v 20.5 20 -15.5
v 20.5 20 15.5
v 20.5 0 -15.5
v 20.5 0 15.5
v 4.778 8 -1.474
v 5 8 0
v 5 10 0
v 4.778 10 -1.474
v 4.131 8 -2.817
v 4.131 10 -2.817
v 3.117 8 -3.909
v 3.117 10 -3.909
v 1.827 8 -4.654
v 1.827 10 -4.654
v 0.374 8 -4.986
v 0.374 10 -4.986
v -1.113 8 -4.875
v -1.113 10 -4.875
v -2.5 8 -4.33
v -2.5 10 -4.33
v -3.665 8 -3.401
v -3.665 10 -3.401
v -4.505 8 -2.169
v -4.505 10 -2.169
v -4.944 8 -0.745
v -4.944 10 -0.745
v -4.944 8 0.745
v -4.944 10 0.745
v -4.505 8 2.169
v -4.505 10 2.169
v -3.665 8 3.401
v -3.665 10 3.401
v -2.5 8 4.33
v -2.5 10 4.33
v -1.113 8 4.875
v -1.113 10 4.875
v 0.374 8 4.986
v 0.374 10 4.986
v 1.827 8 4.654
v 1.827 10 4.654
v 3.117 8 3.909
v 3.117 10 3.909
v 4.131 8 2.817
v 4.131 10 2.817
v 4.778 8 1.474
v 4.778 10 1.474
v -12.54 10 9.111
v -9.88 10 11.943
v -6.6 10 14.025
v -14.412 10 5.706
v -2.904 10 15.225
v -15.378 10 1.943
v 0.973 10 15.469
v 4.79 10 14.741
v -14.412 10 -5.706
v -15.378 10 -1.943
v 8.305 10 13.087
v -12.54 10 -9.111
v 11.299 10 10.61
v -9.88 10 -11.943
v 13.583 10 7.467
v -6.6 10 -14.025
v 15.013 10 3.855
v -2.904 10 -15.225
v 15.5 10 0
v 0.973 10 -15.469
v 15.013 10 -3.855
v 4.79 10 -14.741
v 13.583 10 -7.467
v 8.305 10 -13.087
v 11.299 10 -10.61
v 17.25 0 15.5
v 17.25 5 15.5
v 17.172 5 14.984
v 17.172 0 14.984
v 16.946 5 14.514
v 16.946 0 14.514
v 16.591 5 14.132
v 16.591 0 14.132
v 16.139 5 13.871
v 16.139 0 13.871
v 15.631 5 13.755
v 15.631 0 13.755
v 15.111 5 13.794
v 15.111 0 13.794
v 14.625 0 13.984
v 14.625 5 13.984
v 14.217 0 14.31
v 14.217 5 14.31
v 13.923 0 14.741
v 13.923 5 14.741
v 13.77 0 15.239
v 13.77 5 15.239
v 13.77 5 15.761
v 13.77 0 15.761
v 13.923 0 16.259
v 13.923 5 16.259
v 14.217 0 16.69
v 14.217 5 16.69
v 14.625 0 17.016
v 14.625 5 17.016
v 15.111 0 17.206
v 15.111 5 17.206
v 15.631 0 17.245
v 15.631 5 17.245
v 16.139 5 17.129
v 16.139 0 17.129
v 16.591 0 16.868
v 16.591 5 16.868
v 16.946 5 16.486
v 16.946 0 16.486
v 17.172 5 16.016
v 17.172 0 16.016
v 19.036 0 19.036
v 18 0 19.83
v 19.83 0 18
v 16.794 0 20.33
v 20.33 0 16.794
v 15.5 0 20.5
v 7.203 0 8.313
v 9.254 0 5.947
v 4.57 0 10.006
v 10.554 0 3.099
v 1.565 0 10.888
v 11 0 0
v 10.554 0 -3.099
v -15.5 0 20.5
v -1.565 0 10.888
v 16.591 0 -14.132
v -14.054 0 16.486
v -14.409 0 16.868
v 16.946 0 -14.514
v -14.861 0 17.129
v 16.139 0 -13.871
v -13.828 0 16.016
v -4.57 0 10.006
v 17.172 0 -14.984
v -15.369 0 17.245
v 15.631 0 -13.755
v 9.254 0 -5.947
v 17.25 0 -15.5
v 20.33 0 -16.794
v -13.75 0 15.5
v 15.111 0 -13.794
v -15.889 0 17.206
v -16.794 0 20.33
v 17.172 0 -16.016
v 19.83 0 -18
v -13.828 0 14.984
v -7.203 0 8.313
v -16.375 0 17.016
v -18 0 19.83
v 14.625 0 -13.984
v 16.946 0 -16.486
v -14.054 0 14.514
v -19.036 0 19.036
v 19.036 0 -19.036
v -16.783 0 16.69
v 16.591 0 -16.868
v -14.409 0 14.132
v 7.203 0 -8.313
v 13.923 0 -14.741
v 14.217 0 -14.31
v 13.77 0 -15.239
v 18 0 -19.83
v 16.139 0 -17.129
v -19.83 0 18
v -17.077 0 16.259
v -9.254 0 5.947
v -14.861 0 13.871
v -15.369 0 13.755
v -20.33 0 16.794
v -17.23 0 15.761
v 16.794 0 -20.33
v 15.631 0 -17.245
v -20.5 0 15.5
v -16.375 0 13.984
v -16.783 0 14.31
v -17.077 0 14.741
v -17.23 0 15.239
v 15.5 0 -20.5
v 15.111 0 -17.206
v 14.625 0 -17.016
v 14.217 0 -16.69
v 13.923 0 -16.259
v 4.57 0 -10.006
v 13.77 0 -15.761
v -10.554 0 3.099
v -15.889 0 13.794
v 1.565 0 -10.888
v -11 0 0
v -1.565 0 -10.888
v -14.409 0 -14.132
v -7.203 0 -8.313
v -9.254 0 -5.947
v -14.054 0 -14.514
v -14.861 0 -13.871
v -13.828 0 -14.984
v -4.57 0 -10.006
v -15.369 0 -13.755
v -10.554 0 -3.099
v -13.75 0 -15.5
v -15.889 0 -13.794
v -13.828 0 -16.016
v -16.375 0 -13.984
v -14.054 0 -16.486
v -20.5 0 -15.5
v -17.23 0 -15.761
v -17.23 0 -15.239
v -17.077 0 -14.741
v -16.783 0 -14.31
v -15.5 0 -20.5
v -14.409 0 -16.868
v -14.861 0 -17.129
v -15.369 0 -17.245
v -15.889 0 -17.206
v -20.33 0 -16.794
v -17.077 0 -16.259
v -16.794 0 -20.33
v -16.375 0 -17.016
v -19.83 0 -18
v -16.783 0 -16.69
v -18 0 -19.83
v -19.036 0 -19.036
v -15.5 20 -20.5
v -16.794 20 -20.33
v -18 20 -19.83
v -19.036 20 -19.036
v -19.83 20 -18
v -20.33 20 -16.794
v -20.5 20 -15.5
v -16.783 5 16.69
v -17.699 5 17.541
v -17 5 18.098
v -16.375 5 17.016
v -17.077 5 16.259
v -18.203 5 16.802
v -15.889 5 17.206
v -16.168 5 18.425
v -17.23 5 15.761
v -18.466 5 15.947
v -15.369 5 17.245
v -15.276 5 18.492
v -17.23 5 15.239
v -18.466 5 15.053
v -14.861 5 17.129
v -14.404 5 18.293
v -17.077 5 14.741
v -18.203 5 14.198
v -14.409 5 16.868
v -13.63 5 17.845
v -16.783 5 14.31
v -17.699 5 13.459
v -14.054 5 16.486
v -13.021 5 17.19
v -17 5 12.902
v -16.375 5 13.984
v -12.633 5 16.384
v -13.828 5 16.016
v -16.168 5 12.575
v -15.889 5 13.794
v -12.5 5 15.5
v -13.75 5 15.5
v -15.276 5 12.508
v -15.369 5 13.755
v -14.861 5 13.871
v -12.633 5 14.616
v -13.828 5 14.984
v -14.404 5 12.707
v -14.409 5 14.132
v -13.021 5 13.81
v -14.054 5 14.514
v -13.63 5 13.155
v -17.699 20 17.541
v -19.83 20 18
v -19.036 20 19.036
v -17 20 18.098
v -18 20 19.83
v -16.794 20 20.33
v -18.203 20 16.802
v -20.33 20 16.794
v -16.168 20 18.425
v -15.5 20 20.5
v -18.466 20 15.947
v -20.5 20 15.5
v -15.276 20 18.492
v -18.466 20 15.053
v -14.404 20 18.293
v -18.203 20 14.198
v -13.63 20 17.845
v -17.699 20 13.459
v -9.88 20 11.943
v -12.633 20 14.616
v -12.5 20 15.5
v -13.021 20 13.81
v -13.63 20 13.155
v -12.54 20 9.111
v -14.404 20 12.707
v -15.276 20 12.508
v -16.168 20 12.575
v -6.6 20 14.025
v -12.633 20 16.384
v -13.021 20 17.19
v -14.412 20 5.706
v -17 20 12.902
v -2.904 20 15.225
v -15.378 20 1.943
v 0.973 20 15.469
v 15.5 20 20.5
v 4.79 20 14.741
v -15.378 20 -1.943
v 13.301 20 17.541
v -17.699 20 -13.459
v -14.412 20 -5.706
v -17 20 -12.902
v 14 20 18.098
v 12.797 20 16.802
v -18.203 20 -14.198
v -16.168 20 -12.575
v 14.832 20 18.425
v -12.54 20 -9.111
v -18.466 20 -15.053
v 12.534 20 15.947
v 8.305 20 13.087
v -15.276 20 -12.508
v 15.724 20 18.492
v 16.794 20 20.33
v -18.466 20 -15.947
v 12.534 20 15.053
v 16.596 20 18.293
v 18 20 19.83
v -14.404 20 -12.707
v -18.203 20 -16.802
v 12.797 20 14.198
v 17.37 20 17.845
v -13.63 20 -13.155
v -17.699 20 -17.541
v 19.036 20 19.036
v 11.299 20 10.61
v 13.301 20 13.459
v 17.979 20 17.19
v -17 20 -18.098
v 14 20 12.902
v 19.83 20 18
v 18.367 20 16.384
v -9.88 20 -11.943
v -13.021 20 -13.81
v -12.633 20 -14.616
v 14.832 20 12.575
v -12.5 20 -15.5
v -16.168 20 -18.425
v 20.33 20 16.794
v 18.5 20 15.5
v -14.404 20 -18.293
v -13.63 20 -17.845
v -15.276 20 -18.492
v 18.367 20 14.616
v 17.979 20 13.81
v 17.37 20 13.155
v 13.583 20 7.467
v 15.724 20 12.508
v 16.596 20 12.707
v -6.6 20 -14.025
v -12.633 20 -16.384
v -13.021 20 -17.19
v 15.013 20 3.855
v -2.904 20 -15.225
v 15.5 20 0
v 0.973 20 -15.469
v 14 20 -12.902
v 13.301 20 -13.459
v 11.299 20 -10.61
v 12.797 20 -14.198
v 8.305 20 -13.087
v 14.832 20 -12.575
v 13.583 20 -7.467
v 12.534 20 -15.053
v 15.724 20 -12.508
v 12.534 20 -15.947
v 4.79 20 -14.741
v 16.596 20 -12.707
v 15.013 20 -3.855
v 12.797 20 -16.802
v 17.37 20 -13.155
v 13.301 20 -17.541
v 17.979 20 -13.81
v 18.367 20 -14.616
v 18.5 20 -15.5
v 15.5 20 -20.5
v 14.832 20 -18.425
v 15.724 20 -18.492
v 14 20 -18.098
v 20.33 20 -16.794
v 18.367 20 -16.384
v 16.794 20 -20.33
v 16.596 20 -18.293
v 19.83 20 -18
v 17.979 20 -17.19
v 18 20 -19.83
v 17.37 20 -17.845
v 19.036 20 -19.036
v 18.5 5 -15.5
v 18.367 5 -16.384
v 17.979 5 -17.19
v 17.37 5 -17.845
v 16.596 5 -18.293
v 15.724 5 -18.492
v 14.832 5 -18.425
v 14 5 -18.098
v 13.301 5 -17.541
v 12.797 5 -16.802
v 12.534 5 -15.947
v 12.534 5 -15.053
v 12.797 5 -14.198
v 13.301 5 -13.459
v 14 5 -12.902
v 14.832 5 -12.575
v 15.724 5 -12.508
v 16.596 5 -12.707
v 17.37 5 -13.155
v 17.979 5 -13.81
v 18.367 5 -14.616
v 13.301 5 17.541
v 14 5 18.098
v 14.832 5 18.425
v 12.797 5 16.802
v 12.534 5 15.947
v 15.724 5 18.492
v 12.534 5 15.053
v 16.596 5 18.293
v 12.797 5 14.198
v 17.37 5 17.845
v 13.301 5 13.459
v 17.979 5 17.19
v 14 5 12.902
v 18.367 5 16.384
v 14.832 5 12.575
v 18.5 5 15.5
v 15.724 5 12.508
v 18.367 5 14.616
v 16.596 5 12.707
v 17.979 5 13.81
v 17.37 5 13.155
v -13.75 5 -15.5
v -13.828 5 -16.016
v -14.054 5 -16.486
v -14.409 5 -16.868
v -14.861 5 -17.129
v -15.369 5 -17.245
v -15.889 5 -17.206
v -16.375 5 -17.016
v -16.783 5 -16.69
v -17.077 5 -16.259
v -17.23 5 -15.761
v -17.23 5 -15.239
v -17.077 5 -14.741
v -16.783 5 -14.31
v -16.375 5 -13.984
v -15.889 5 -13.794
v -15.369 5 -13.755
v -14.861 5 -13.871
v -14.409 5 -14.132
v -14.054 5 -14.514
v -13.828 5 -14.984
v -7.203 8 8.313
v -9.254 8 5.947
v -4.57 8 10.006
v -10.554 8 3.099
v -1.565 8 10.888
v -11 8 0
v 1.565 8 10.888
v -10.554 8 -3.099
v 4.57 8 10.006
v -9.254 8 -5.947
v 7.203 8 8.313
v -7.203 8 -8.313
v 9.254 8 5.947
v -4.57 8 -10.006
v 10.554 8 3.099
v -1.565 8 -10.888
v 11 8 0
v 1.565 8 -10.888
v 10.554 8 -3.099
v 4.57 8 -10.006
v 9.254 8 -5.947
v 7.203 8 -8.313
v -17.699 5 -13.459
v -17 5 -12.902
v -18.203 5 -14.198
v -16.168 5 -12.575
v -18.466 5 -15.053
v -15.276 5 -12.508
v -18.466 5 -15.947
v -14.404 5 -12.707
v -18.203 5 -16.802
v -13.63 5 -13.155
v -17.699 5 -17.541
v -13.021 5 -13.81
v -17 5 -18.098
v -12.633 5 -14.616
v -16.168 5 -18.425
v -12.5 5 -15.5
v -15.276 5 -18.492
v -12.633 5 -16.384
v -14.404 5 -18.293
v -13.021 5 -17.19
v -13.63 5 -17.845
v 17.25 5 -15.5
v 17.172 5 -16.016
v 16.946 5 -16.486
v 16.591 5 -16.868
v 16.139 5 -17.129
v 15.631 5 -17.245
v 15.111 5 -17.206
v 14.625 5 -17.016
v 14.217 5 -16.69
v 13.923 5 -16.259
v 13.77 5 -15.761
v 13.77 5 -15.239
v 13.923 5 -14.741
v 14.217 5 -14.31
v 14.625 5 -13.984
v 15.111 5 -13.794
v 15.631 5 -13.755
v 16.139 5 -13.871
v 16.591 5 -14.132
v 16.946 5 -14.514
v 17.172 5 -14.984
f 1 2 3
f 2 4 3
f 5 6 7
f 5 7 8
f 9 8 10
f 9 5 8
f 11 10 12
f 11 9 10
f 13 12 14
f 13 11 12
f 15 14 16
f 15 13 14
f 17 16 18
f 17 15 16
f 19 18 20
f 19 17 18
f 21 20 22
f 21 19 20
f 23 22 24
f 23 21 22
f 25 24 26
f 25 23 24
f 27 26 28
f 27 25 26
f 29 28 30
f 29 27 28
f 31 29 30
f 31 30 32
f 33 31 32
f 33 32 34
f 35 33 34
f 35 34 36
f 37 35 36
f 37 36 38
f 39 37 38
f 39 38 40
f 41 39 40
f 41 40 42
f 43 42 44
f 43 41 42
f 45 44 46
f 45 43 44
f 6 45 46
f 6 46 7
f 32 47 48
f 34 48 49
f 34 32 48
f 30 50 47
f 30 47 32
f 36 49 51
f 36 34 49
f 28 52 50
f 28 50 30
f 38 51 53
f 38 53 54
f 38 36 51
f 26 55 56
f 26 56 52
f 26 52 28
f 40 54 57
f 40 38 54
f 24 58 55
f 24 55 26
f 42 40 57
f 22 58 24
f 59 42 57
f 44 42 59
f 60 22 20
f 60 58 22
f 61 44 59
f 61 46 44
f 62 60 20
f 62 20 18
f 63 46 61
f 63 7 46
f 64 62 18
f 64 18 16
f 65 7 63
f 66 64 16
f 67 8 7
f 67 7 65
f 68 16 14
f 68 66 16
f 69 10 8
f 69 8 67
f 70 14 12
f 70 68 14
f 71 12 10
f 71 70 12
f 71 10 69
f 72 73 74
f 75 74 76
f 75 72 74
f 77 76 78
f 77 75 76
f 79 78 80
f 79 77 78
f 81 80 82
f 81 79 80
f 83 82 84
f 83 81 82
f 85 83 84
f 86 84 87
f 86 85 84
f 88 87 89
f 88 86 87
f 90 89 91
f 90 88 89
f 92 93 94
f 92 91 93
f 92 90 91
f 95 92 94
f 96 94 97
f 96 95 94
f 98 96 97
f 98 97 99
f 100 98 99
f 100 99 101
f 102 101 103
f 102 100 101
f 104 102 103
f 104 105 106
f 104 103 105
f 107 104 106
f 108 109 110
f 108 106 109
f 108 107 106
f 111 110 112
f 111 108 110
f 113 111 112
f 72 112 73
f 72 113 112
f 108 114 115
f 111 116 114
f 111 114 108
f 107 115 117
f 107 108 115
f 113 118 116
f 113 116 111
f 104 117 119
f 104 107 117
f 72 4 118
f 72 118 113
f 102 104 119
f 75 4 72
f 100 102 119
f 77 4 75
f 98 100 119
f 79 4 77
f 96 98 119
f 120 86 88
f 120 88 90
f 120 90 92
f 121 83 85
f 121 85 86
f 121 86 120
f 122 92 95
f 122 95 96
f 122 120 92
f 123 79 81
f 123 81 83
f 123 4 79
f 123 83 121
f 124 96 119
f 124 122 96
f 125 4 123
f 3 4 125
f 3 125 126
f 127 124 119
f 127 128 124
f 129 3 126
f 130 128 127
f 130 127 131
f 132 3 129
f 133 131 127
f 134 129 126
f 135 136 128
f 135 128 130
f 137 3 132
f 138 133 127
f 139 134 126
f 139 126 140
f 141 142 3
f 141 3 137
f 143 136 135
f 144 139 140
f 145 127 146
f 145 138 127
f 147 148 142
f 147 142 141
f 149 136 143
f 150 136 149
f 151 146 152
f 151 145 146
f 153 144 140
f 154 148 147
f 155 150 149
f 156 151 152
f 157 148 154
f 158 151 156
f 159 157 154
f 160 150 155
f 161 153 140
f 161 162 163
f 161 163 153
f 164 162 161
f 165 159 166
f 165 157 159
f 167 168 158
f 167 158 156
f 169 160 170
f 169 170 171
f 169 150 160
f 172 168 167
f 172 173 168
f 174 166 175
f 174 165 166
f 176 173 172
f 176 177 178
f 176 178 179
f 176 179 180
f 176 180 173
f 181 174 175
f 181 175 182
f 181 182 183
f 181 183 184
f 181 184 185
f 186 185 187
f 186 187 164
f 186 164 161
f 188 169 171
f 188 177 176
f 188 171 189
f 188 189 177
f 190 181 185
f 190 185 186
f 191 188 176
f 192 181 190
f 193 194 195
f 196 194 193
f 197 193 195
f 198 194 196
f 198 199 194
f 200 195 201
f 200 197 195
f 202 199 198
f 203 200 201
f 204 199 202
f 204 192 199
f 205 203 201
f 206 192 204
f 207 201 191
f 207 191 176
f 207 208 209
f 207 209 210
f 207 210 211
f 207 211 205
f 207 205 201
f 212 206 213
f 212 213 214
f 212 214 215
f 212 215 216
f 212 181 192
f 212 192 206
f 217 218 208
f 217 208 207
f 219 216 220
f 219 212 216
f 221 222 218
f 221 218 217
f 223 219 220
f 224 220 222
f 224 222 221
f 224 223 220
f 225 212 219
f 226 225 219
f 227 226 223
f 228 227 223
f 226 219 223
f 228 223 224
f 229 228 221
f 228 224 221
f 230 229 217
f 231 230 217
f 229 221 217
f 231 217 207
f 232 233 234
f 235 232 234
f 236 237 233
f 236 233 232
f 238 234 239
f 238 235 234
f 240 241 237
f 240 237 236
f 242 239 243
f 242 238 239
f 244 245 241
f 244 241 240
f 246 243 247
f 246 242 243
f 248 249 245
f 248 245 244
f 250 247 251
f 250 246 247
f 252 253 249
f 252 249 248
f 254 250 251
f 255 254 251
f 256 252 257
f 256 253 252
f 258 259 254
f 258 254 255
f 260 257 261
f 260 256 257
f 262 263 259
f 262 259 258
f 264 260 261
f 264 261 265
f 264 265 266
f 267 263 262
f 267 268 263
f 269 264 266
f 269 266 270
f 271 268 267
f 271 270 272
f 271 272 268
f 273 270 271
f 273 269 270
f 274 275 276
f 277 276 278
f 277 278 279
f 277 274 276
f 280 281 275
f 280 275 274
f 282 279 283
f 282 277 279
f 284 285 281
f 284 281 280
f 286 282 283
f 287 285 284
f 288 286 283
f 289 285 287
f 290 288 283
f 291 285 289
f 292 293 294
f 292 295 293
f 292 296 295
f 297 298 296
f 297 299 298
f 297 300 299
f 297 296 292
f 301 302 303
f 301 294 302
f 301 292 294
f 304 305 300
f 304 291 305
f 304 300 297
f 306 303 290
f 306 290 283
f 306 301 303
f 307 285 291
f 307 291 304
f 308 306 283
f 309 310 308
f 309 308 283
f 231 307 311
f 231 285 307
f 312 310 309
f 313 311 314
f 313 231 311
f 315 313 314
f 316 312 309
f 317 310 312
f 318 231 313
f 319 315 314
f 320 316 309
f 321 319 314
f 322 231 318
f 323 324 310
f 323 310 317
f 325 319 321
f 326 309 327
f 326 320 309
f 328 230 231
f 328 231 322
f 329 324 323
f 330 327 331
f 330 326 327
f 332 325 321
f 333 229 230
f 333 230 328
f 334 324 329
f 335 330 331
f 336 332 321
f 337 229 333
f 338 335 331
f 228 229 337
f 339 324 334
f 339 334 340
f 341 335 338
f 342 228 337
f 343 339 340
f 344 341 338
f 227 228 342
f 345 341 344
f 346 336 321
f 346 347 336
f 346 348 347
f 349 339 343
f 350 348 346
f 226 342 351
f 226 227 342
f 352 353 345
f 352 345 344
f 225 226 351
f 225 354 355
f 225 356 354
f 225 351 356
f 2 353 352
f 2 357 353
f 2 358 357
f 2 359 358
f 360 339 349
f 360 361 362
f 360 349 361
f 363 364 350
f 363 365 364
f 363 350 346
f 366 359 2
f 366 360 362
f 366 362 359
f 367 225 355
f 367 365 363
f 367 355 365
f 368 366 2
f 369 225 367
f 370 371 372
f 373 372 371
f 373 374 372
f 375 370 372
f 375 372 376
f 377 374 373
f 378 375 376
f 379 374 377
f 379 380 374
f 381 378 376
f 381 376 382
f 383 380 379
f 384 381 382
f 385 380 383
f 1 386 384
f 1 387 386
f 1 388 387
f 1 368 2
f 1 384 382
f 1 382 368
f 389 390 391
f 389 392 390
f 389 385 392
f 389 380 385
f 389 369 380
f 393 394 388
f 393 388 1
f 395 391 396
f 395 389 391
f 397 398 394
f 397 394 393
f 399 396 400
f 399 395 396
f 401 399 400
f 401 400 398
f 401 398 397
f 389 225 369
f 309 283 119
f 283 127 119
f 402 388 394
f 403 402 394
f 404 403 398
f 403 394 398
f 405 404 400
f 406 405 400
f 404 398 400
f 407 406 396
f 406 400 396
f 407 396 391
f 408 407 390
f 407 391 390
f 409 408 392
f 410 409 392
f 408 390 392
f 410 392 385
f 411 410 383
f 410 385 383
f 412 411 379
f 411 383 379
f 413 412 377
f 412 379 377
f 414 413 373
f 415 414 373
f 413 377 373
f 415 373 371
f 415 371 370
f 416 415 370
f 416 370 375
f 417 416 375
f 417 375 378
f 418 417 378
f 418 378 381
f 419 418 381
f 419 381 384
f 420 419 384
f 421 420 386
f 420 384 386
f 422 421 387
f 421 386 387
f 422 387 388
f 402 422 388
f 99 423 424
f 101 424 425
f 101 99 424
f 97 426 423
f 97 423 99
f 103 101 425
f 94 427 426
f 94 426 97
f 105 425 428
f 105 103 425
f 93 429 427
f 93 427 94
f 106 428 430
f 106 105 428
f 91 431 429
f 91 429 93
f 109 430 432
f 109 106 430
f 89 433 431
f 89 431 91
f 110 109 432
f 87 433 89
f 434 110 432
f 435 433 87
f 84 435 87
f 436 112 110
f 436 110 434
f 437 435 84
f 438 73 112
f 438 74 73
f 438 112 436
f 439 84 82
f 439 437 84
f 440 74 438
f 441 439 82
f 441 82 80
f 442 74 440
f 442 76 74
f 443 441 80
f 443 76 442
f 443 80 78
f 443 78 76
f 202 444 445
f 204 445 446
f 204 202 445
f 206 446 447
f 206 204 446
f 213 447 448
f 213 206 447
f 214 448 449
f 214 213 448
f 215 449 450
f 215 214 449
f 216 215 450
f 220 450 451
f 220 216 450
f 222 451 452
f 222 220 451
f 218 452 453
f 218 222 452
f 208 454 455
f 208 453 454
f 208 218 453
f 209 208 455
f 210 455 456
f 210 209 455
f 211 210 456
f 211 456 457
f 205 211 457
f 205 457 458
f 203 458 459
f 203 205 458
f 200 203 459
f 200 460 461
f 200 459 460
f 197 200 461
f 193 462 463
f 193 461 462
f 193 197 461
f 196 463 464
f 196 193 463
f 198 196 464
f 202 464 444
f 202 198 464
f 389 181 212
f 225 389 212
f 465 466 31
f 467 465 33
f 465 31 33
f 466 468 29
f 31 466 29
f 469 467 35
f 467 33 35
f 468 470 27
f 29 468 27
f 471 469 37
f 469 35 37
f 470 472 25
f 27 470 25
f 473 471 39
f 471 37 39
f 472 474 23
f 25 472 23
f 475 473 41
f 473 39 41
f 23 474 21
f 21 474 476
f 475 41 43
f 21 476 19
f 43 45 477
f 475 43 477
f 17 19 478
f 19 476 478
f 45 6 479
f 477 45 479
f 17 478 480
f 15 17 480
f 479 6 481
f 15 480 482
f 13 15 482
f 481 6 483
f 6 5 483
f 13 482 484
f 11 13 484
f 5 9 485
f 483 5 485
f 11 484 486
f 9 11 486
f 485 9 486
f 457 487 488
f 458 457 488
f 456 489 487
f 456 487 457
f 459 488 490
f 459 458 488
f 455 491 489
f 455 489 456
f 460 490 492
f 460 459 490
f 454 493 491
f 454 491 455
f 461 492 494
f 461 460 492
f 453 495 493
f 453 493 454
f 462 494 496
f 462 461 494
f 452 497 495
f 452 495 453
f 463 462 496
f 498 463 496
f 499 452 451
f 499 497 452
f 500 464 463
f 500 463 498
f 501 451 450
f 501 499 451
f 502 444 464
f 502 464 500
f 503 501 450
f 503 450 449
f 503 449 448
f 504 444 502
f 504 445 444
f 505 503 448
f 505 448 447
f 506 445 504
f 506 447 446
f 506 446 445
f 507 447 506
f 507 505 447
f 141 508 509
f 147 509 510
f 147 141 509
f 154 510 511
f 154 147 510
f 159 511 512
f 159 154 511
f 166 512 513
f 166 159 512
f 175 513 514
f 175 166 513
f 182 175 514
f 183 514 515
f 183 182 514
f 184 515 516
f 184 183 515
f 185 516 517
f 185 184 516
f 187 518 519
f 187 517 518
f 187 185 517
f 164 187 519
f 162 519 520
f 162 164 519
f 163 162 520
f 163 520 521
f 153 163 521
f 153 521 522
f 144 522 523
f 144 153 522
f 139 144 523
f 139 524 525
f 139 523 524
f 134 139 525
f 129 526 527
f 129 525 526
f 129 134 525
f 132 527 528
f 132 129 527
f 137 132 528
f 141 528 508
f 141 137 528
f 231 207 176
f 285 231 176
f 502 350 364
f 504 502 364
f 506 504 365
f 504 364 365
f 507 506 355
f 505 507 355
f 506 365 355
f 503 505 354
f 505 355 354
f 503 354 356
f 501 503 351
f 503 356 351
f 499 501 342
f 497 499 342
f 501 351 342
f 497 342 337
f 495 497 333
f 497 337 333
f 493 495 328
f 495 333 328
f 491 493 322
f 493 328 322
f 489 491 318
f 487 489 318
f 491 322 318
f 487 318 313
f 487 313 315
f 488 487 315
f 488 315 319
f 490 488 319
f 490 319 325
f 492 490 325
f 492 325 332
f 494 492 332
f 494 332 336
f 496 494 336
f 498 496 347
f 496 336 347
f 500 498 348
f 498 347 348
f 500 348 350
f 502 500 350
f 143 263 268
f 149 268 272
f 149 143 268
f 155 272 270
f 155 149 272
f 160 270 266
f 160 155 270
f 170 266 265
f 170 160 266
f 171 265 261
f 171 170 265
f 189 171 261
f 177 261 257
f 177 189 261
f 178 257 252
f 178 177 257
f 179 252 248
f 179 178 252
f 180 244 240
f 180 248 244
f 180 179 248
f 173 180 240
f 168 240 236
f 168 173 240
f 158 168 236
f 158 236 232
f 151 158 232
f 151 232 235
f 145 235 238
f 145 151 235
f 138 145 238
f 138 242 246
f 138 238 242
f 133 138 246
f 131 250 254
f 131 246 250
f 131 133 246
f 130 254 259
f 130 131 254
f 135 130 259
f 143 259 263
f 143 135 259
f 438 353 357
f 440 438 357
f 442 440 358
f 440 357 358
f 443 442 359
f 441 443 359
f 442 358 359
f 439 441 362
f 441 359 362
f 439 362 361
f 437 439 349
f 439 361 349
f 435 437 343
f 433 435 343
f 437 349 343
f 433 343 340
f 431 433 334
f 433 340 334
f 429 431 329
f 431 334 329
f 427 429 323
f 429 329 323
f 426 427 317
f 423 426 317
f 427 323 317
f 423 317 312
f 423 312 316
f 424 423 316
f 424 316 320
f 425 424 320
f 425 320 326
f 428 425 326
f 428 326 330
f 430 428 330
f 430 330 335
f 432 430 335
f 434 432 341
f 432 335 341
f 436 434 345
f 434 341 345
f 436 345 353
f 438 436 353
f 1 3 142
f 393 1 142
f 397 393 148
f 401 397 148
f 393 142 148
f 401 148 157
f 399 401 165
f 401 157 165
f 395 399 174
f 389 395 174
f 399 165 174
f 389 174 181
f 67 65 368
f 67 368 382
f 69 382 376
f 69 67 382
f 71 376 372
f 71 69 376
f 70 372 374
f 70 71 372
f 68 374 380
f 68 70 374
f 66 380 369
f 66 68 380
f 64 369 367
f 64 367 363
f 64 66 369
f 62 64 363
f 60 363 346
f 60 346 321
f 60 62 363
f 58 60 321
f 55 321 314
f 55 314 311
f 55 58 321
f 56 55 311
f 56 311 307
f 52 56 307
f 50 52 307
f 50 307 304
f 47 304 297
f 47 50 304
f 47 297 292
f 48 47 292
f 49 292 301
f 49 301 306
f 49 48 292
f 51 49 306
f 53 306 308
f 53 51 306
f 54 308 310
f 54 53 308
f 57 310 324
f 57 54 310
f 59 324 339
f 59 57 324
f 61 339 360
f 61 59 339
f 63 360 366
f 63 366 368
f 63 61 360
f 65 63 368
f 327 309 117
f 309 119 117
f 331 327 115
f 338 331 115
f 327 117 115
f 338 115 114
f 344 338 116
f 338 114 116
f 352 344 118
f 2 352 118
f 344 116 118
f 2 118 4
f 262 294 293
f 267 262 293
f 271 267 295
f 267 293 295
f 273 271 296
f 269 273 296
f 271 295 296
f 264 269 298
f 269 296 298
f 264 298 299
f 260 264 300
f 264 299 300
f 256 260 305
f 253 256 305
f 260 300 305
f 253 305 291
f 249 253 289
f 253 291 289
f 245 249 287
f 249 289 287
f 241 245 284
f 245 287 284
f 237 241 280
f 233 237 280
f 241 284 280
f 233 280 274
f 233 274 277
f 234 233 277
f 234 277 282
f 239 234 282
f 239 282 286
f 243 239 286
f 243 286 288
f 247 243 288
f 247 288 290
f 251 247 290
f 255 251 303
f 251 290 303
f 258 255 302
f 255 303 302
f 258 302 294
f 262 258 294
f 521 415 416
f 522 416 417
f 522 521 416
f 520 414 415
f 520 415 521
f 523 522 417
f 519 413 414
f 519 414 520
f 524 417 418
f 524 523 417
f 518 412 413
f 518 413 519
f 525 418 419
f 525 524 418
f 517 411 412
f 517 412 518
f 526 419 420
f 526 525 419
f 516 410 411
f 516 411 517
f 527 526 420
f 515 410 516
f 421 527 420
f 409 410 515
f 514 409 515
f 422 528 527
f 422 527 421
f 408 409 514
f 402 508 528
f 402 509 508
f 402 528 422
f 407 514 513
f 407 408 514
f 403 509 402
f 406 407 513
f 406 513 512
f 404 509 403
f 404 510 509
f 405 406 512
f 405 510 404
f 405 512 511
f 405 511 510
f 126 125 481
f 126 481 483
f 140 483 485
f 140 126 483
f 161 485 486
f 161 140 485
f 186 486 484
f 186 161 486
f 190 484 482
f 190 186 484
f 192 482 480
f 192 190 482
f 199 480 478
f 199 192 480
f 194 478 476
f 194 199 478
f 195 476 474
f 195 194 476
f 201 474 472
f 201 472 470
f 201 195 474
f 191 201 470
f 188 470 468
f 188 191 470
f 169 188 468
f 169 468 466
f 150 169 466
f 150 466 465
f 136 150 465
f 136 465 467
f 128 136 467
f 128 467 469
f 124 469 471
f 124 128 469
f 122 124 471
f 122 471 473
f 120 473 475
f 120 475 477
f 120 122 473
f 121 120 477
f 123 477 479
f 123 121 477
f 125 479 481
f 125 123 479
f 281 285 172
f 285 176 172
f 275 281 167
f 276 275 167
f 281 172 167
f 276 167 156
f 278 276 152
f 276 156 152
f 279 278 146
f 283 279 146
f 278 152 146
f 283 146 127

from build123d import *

# Parameters (mm, degrees)
SKETCH1_R           = 11
SKETCH1_R_2         = 1.75
BOSS_EXTRUDE1_DEPTH = 8
SKETCH2_R           = 1.75
SKETCH2_R_2         = 5
BOSS_EXTRUDE2_DEPTH = 2
SKETCH3_R           = 1.75
SKETCH3_R_2         = 15.5
BOSS_EXTRUDE3_DEPTH = 10
SKETCH4_R           = 3
CUT_EXTRUDE1_DEPTH  = 15


with BuildPart() as part:
    # Sketch1 → Boss-Extrude1 (new body)
    with BuildSketch(Plane(origin=(0, 0, 0), x_dir=(1, 0, 0), z_dir=(0, 1, 0))):
        with BuildLine():
            Line((-15.5, 20.5), (15.5, 20.5))
            ThreePointArc((15.5, 20.5), (19.035533906, 19.035533906), (20.5, 15.5))
            Line((20.5, 15.5), (20.5, -15.5))
            ThreePointArc((20.5, -15.5), (19.035533906, -19.035533906), (15.5, -20.5))
            Line((15.5, -20.5), (-15.5, -20.5))
            ThreePointArc((-15.5, -20.5), (-19.035533906, -19.035533906), (-20.5, -15.5))
            Line((-20.5, -15.5), (-20.5, 15.5))
            ThreePointArc((-20.5, 15.5), (-19.035533906, 19.035533906), (-15.5, 20.5))
        make_face()
        Circle(SKETCH1_R, mode=Mode.SUBTRACT)
        with Locations((-15.5, 15.5)):
            Circle(SKETCH1_R_2, mode=Mode.SUBTRACT)
        with Locations((15.5, 15.5)):
            Circle(SKETCH1_R_2, mode=Mode.SUBTRACT)
        with Locations((15.5, -15.5)):
            Circle(SKETCH1_R_2, mode=Mode.SUBTRACT)
        with Locations((-15.5, -15.5)):
            Circle(SKETCH1_R_2, mode=Mode.SUBTRACT)
    extrude(amount=BOSS_EXTRUDE1_DEPTH)

    # Sketch2 → Boss-Extrude2 (add)
    with BuildSketch(Plane(origin=(0, 8, 0), x_dir=(1, 0, 0), z_dir=(0, 1, 0))):
        with BuildLine():
            Line((-20.5, 15.5), (-20.5, -15.5))
            ThreePointArc((-20.5, -15.5), (-19.035533906, -19.035533906), (-15.5, -20.5))
            Line((-15.5, -20.5), (15.5, -20.5))
            ThreePointArc((15.5, -20.5), (19.035533906, -19.035533906), (20.5, -15.5))
            Line((20.5, -15.5), (20.5, 15.5))
            ThreePointArc((20.5, 15.5), (19.035533906, 19.035533906), (15.5, 20.5))
            Line((15.5, 20.5), (-15.5, 20.5))
            ThreePointArc((-15.5, 20.5), (-19.035533906, 19.035533906), (-20.5, 15.5))
        make_face()
        with Locations((15.5, 15.5)):
            Circle(SKETCH2_R, mode=Mode.SUBTRACT)
        with Locations((15.5, -15.5)):
            Circle(SKETCH2_R, mode=Mode.SUBTRACT)
        with Locations((-15.5, 15.5)):
            Circle(SKETCH2_R, mode=Mode.SUBTRACT)
        Circle(SKETCH2_R_2, mode=Mode.SUBTRACT)
        with Locations((-15.5, -15.5)):
            Circle(SKETCH2_R, mode=Mode.SUBTRACT)
    extrude(amount=BOSS_EXTRUDE2_DEPTH)

    # Sketch3 → Boss-Extrude3 (add)
    with BuildSketch(Plane(origin=(0, 10, 0), x_dir=(1, 0, 0), z_dir=(0, 1, 0))):
        with BuildLine():
            Line((-20.5, 15.5), (-20.5, -15.5))
            ThreePointArc((-20.5, -15.5), (-19.035533906, -19.035533906), (-15.5, -20.5))
            Line((-15.5, -20.5), (15.5, -20.5))
            ThreePointArc((15.5, -20.5), (19.035533906, -19.035533906), (20.5, -15.5))
            Line((20.5, -15.5), (20.5, 15.5))
            ThreePointArc((20.5, 15.5), (19.035533906, 19.035533906), (15.5, 20.5))
            Line((15.5, 20.5), (-15.5, 20.5))
            ThreePointArc((-15.5, 20.5), (-19.035533906, 19.035533906), (-20.5, 15.5))
        make_face()
        with Locations((15.5, 15.5)):
            Circle(SKETCH3_R, mode=Mode.SUBTRACT)
        with Locations((15.5, -15.5)):
            Circle(SKETCH3_R, mode=Mode.SUBTRACT)
        with Locations((-15.5, -15.5)):
            Circle(SKETCH3_R, mode=Mode.SUBTRACT)
        with Locations((-15.5, 15.5)):
            Circle(SKETCH3_R, mode=Mode.SUBTRACT)
        Circle(SKETCH3_R_2, mode=Mode.SUBTRACT)
    extrude(amount=BOSS_EXTRUDE3_DEPTH)

    # Sketch4 → Cut-Extrude1 (cut)
    with BuildSketch(Plane(origin=(0, 20, 0), x_dir=(1, 0, 0), z_dir=(0, 1, 0))):
        with Locations((-15.5, 15.5)):
            Circle(SKETCH4_R)
        with Locations((15.5, 15.5)):
            Circle(SKETCH4_R)
        with Locations((15.5, -15.5)):
            Circle(SKETCH4_R)
        with Locations((-15.5, -15.5)):
            Circle(SKETCH4_R)
    extrude(amount=-CUT_EXTRUDE1_DEPTH, mode=Mode.SUBTRACT)


solid = part.part
